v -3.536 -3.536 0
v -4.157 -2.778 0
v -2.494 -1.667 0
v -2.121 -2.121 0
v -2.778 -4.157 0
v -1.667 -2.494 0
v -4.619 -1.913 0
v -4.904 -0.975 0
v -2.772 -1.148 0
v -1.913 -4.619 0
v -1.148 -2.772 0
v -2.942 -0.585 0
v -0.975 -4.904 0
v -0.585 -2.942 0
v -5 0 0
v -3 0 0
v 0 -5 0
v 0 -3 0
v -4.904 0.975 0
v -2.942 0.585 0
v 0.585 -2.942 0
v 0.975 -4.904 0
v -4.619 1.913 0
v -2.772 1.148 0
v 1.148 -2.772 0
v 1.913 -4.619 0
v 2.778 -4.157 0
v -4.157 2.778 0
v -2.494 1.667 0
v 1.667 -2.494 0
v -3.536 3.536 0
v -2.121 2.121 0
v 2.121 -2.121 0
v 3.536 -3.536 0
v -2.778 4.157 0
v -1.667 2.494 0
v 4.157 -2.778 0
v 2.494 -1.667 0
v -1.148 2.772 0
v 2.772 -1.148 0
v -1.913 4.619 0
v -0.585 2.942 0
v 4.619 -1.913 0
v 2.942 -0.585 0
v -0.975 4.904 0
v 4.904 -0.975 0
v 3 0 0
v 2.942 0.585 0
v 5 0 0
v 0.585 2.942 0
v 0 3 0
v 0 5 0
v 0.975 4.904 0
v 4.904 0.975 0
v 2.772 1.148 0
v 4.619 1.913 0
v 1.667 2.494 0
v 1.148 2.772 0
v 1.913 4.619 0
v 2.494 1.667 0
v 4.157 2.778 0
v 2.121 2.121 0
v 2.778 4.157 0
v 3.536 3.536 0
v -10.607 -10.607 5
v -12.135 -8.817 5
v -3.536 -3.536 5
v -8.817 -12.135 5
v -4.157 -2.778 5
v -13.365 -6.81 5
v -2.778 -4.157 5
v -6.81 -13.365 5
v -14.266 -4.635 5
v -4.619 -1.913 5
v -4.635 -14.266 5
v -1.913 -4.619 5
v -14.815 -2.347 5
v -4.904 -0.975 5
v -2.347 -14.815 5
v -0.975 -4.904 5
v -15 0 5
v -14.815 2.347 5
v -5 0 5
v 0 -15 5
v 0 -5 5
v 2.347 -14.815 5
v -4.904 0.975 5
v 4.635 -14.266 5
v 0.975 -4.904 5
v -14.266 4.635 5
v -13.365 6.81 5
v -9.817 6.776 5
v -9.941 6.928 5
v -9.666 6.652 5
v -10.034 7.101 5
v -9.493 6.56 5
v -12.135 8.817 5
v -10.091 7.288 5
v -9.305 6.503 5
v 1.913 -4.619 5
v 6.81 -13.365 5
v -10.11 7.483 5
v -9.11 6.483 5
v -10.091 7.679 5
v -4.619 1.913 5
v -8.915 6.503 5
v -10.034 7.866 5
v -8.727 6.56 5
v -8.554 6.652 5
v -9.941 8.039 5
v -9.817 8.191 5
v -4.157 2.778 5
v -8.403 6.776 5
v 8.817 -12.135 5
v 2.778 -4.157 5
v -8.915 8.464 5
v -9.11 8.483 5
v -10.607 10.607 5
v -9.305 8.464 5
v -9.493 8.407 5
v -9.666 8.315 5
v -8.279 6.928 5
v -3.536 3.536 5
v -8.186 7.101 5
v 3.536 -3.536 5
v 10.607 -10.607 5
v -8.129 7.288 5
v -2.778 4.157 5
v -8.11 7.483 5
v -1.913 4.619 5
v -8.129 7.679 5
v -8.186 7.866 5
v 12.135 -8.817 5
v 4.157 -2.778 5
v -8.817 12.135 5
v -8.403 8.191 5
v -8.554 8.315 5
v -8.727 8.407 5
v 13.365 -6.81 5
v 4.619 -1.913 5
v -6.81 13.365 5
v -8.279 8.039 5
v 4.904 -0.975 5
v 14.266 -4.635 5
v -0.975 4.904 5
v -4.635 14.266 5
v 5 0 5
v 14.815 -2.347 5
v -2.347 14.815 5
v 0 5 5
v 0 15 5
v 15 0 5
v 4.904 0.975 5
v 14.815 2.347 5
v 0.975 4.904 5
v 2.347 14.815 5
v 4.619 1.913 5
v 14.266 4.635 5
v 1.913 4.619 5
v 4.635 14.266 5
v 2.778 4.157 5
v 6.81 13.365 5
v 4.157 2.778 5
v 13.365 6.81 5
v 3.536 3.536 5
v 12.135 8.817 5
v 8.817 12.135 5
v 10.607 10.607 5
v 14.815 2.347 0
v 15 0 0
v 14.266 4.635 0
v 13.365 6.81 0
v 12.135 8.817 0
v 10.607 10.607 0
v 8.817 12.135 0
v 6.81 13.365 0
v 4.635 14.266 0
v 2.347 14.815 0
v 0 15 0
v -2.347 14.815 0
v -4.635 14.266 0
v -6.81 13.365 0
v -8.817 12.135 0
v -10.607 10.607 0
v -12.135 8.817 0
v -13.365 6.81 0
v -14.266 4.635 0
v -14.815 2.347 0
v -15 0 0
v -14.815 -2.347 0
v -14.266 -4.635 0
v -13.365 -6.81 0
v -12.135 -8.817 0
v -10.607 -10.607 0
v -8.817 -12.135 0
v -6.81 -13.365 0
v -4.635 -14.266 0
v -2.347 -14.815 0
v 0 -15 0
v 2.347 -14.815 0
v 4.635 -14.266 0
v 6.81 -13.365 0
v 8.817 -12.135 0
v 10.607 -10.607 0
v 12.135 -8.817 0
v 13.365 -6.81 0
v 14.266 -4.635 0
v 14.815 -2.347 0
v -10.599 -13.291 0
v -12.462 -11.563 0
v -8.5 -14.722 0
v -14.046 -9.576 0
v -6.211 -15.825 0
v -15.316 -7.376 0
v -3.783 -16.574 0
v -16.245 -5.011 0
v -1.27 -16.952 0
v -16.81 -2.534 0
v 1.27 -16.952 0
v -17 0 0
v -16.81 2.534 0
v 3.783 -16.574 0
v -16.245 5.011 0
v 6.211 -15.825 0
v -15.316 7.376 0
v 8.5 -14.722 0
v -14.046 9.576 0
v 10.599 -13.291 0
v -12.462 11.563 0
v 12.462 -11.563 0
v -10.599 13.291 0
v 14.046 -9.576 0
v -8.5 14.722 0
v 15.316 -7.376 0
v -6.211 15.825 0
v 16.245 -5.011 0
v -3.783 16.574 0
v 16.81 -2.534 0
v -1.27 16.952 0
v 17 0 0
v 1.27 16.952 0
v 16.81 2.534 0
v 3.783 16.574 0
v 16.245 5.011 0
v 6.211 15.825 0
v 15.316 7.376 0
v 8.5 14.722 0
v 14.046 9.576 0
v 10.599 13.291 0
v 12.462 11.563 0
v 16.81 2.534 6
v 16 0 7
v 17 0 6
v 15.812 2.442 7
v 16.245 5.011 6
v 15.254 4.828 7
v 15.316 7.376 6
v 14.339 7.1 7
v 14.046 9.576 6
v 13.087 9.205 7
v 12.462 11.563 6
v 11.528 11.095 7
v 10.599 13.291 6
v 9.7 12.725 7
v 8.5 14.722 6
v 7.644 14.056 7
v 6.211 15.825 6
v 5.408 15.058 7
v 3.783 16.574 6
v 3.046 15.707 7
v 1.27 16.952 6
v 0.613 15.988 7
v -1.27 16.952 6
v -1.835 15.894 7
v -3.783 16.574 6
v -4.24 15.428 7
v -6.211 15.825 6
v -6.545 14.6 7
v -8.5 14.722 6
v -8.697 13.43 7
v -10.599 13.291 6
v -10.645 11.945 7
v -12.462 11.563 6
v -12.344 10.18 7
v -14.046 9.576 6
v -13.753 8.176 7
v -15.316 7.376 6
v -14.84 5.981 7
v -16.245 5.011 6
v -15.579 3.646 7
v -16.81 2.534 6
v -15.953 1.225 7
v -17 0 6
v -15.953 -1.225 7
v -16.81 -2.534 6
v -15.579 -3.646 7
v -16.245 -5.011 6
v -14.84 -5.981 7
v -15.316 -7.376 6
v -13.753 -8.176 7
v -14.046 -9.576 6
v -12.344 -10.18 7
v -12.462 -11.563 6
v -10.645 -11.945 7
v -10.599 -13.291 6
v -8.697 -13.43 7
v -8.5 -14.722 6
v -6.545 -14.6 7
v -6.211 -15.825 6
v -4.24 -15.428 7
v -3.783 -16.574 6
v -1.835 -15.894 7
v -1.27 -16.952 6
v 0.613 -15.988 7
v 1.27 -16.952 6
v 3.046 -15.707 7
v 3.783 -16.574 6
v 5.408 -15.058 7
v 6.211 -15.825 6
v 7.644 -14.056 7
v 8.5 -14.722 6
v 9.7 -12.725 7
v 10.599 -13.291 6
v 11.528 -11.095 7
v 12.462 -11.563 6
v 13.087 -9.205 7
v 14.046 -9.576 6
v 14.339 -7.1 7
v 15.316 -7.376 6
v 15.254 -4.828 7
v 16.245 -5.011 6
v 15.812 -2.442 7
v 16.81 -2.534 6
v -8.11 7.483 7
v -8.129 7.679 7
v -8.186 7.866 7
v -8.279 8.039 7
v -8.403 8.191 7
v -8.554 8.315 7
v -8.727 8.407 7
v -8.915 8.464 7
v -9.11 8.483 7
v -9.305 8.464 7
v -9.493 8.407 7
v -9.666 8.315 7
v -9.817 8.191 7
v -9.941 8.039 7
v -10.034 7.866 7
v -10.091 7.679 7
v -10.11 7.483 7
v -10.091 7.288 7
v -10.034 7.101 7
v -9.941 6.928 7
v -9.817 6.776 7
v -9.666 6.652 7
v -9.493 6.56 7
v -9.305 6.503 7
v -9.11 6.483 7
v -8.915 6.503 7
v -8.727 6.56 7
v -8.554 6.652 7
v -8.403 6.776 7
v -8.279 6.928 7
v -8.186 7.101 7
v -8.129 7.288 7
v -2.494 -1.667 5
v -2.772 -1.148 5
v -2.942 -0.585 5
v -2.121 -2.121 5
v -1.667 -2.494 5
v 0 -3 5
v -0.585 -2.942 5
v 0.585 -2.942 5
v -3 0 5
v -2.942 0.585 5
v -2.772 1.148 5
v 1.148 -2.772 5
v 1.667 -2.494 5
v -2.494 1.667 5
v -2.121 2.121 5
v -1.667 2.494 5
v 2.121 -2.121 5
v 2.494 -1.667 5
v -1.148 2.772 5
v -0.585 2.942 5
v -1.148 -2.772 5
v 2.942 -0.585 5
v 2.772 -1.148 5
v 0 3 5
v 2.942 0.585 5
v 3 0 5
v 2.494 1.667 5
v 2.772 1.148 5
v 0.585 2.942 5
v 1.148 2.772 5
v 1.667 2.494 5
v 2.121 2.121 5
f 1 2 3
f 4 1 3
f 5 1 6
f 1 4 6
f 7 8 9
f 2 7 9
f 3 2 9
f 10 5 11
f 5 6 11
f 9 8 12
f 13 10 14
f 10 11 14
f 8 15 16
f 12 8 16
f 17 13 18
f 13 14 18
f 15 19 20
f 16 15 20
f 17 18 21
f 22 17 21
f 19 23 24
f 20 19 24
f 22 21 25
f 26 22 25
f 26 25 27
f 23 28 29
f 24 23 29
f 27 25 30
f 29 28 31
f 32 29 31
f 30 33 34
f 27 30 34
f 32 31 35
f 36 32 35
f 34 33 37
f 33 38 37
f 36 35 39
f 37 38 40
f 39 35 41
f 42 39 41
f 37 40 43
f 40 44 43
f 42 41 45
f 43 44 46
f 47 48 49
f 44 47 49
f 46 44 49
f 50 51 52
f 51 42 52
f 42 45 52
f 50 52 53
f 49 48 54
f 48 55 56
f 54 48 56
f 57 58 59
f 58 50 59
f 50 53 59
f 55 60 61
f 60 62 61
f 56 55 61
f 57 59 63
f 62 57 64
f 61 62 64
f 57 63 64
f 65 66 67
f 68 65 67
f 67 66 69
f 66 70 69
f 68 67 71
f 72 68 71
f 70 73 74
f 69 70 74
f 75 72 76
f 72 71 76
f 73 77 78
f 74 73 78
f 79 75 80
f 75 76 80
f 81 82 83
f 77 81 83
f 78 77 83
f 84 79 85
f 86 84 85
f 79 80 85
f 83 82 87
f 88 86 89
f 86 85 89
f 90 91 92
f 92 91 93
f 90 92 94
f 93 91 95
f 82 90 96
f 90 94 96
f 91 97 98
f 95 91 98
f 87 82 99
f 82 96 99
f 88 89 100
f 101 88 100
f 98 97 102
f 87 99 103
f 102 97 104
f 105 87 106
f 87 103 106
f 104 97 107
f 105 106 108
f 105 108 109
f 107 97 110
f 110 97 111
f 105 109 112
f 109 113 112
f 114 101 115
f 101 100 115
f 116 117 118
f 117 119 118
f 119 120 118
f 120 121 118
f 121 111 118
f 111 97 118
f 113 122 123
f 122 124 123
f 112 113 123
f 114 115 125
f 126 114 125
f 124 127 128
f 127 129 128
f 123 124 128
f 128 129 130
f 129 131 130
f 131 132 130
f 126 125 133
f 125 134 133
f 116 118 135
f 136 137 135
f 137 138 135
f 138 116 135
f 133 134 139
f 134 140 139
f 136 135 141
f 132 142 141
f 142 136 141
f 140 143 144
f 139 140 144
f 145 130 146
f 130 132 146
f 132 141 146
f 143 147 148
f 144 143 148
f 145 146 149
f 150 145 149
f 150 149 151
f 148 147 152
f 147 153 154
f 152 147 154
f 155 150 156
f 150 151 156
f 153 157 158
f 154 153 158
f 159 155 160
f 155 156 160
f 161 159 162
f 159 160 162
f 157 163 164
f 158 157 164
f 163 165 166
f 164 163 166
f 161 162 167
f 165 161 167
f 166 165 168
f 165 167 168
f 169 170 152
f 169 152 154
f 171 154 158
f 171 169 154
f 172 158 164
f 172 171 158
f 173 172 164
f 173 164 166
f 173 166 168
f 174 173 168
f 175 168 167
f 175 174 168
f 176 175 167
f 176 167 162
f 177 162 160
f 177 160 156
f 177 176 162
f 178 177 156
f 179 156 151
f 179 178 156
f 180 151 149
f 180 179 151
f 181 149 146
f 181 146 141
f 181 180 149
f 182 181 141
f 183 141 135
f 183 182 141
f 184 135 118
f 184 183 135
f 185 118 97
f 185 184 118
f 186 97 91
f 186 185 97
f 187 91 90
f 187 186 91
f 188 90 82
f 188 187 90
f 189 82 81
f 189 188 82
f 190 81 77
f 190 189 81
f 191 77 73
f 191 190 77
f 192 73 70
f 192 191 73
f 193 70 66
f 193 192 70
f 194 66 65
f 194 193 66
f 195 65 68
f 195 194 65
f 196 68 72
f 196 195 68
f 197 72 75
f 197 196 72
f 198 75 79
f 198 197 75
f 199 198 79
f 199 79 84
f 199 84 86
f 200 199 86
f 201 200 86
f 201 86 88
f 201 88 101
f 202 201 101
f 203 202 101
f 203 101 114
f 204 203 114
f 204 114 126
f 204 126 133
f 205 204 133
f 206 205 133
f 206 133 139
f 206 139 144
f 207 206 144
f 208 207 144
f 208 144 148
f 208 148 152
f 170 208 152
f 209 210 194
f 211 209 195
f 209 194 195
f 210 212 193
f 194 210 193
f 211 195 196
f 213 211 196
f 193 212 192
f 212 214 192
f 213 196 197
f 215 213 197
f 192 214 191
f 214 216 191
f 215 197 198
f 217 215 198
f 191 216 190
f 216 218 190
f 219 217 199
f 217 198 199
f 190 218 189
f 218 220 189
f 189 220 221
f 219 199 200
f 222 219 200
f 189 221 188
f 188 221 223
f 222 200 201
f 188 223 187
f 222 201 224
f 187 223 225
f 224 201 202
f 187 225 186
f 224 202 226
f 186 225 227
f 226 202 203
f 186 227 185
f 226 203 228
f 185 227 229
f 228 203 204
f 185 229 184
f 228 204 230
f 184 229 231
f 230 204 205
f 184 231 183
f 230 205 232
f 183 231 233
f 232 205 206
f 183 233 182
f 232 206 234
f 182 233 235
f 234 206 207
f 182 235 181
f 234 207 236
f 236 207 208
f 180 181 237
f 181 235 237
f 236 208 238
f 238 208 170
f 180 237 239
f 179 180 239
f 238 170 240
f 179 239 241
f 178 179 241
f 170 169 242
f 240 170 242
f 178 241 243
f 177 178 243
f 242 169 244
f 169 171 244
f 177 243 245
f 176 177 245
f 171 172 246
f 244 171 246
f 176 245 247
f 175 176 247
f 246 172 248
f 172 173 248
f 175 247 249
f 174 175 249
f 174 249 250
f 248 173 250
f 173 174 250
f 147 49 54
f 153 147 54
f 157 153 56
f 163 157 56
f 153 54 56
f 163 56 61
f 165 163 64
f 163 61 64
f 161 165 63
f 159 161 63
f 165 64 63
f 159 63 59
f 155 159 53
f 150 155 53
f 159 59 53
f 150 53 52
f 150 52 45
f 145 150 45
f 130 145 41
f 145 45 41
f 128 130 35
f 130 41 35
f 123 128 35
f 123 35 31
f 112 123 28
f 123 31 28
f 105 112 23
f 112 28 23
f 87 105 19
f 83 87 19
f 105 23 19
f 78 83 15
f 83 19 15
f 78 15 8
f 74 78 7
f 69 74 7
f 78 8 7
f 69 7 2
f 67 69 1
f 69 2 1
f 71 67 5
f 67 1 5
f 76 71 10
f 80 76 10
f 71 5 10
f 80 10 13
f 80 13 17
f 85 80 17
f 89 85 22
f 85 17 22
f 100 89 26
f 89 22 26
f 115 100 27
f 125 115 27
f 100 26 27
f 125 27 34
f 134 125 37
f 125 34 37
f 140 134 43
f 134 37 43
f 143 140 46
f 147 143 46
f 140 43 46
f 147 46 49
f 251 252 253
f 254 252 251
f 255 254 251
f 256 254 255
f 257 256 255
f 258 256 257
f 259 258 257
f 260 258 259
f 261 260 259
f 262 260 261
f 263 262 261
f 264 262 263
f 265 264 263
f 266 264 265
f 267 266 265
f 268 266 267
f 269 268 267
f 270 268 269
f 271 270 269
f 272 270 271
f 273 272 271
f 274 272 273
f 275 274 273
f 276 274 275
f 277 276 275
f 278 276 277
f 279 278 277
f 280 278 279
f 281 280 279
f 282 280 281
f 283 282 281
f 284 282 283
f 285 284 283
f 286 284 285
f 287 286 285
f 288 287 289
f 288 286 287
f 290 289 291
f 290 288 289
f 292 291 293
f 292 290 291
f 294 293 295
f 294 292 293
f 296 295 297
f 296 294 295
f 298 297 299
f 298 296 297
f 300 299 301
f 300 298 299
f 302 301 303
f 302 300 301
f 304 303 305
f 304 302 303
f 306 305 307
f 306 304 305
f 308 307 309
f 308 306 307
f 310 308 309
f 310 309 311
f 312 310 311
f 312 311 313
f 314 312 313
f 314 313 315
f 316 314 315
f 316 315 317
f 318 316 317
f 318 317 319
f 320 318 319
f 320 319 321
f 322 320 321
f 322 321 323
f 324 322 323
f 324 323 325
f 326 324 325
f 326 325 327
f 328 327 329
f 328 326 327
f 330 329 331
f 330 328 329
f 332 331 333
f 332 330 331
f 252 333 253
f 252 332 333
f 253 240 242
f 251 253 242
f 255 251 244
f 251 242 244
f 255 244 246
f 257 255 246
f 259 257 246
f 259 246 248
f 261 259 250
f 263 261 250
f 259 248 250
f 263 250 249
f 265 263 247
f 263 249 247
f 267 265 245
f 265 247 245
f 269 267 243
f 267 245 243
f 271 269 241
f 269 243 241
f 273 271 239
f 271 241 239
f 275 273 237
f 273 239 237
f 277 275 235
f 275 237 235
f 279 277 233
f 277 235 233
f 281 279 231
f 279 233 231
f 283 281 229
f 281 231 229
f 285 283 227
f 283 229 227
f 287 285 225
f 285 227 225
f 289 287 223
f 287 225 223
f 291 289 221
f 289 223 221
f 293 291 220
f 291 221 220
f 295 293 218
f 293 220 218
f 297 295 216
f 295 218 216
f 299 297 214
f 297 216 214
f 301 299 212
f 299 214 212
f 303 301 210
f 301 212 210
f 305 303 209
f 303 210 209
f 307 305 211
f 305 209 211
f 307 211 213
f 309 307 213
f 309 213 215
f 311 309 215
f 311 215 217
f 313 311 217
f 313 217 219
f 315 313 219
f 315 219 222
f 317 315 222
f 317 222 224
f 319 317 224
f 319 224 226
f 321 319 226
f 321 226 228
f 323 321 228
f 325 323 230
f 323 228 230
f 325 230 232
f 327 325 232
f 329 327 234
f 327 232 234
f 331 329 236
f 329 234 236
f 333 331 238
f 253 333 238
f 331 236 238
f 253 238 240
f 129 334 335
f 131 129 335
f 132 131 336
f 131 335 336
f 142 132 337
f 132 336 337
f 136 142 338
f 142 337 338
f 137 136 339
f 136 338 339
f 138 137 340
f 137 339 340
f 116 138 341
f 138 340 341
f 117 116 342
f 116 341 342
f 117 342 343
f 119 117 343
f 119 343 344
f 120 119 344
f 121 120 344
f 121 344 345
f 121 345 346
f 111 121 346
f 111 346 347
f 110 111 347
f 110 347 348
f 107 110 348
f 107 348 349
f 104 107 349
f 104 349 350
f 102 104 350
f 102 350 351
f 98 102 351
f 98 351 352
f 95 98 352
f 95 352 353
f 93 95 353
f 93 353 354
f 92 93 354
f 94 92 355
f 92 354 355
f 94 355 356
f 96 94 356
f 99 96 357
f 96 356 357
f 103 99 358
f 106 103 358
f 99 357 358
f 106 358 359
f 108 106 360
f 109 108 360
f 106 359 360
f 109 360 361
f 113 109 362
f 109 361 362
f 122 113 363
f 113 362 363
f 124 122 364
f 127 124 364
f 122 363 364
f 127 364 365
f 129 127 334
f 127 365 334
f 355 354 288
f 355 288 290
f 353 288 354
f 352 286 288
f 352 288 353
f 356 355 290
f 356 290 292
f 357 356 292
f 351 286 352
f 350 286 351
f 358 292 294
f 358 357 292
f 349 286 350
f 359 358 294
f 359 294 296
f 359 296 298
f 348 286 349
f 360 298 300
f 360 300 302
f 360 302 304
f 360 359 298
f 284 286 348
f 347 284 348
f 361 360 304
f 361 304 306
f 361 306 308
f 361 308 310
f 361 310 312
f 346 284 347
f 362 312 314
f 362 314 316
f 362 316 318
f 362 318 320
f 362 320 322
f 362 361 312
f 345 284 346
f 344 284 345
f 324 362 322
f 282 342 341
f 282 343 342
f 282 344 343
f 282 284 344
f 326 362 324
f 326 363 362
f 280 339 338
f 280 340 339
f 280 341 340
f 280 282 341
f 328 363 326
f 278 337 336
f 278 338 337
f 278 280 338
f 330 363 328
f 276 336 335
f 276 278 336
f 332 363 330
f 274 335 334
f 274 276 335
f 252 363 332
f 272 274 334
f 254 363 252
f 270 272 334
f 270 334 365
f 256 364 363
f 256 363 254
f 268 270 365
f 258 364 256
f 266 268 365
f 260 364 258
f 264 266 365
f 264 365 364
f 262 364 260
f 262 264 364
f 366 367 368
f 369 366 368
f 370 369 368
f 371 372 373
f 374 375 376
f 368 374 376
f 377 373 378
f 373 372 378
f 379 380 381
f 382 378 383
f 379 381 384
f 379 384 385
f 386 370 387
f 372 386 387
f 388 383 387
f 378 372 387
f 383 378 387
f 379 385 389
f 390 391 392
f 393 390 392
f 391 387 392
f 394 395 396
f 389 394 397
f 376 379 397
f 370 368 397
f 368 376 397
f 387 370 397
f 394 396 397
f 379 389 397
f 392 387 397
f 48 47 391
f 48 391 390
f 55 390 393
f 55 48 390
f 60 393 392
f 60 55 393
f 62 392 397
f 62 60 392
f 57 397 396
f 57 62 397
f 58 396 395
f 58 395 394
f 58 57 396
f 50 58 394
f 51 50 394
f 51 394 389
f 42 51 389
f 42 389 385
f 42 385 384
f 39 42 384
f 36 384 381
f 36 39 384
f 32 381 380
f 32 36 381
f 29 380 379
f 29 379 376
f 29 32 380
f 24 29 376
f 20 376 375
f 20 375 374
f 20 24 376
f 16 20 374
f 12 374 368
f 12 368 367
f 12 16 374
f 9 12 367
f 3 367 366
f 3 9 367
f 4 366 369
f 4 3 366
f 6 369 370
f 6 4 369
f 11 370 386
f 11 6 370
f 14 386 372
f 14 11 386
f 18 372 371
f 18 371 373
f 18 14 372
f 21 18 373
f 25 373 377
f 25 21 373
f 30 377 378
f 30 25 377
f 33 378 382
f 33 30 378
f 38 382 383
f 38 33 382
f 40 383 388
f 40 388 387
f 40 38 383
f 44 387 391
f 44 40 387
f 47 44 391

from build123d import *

# Parameters (mm, degrees)
SKETCH_R        = 17
PAD_DEPTH       = 7
SKETCH002_R     = 15
SKETCH002_R_2   = 5
POCKET_DEPTH    = 5
SKETCH001_R     = 3
POCKET001_DEPTH = 5
SKETCH003_R     = 1
POCKET002_DEPTH = 5
CHAMFER_SIZE    = 1


with BuildPart() as part:
    # Sketch → Pad (new body)
    with BuildSketch(Plane.XY):
        Circle(SKETCH_R)
    extrude(amount=PAD_DEPTH)

    # Sketch002 → Pocket (cut)
    with BuildSketch(Plane.XY):
        Circle(SKETCH002_R)
        Circle(SKETCH002_R_2, mode=Mode.SUBTRACT)
    extrude(amount=POCKET_DEPTH, mode=Mode.SUBTRACT)

    # Sketch001 → Pocket001 (cut)
    with BuildSketch(Plane.XY):
        Circle(SKETCH001_R)
    extrude(amount=POCKET001_DEPTH, mode=Mode.SUBTRACT)

    # Sketch003 (on Face3 of Pocket001) → Pocket002 (cut)
    with BuildSketch(Plane.XY.offset(7)):
        with Locations((-9.109988, 7.483499)):
            Circle(SKETCH003_R)
    extrude(amount=-POCKET002_DEPTH, mode=Mode.SUBTRACT)

    # Chamfer
    chamfer_edges = [part.edges().sort_by_distance(p)[0] for p in [
        (-17, 0, 7),
    ]]
    chamfer(chamfer_edges, length=CHAMFER_SIZE)


solid = part.part
